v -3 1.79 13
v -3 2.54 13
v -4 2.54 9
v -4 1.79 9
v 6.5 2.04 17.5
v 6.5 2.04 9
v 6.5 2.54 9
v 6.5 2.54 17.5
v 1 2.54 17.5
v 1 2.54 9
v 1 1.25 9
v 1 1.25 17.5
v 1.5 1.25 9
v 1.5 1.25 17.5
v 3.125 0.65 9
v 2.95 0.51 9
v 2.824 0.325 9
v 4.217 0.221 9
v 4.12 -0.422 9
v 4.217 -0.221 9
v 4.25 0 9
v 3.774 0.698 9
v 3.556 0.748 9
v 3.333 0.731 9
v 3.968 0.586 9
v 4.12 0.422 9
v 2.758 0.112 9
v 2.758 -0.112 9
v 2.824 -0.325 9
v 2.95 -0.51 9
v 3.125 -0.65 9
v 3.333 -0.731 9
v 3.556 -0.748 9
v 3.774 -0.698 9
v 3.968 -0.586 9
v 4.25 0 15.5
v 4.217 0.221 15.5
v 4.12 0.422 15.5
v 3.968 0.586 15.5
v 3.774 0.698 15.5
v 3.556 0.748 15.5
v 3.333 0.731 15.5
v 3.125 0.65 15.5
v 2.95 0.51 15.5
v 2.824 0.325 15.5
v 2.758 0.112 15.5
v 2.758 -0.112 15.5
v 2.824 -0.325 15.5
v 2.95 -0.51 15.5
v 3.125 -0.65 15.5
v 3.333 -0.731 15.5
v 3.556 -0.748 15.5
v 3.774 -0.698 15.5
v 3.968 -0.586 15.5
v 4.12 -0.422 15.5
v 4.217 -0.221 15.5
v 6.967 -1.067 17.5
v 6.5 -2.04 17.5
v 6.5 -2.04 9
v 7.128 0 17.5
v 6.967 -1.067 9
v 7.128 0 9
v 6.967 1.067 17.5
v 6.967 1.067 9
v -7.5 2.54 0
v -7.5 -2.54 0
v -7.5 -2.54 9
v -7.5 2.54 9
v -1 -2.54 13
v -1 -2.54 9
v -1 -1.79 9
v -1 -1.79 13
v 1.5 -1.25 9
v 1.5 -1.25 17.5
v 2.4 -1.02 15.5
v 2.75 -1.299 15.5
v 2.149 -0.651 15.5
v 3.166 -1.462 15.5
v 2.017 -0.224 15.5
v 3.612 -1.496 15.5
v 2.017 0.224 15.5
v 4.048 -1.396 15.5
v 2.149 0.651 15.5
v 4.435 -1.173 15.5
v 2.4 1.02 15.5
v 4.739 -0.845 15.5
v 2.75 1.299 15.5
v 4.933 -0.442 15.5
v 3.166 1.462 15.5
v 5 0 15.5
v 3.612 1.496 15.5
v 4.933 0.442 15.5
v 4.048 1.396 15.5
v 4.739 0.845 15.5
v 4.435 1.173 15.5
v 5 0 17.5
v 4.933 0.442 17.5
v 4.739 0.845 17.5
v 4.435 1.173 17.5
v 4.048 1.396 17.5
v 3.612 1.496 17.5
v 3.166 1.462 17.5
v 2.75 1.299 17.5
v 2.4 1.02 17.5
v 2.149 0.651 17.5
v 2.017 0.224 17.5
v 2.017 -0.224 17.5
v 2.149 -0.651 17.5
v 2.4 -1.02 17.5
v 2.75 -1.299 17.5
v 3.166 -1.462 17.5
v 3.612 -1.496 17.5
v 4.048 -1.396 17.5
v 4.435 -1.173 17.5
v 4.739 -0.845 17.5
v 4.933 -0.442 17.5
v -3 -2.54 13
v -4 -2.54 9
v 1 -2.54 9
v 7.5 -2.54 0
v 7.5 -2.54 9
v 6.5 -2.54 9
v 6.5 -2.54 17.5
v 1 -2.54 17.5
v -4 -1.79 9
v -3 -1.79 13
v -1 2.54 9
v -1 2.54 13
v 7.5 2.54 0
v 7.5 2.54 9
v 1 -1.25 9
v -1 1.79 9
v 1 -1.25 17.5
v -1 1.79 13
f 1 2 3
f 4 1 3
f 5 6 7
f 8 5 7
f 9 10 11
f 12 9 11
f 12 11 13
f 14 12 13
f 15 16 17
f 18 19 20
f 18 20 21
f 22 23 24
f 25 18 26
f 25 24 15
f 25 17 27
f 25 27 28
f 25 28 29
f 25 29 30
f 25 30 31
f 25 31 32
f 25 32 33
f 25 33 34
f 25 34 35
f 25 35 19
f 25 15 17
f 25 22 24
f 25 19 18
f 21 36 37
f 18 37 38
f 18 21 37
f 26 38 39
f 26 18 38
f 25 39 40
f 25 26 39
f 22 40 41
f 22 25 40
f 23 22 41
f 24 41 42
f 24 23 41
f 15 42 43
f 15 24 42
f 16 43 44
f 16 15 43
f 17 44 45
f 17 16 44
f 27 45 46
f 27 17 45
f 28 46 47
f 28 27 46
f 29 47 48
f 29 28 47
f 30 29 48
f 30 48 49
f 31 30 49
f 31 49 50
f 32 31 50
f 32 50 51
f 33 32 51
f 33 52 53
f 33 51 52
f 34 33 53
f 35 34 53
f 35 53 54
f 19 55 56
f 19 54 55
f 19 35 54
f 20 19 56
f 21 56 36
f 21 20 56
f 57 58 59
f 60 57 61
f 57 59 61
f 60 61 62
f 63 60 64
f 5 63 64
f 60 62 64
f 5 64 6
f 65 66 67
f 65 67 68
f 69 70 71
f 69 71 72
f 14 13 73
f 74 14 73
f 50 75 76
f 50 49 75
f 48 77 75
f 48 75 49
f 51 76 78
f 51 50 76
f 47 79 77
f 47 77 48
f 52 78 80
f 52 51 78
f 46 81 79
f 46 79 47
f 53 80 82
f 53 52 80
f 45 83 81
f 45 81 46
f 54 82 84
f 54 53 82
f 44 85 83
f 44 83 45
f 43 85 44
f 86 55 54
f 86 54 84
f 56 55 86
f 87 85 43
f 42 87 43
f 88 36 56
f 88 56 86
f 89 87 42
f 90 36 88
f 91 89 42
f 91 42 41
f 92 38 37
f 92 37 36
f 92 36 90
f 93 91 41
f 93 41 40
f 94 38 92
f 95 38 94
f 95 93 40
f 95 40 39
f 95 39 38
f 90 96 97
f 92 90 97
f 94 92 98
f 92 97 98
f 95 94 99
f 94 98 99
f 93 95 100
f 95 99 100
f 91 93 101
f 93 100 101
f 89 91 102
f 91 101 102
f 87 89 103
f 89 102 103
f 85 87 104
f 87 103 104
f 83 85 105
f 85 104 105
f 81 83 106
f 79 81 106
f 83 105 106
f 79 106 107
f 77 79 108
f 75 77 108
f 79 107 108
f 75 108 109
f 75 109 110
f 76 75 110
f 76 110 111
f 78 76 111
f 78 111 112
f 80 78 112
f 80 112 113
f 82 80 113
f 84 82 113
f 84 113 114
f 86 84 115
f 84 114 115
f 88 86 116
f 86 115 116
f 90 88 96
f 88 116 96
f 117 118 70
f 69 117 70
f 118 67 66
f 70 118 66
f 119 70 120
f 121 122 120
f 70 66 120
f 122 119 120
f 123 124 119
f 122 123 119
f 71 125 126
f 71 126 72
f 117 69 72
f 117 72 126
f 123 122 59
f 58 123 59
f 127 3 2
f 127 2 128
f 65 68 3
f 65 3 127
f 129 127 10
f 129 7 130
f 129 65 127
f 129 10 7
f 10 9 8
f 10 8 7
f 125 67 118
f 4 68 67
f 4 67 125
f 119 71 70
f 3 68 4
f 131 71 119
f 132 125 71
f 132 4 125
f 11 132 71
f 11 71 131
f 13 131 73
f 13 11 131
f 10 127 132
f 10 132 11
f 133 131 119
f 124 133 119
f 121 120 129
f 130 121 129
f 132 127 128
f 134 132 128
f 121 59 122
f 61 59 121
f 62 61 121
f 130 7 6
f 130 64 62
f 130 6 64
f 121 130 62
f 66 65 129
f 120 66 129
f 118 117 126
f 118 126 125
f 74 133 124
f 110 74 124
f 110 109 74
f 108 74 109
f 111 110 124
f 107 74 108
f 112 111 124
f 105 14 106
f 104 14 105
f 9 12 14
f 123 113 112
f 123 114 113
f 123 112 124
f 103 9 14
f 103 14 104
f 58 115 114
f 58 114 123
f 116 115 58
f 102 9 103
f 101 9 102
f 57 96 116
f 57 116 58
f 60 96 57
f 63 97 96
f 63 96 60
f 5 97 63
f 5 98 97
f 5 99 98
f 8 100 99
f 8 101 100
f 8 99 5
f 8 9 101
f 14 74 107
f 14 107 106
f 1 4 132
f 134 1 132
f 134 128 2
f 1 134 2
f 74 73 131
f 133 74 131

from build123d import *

# Parameters (mm, degrees)
SKETCH_1_W          = 15
SKETCH_1_H          = 5.08
EXTRUDE_1_DEPTH     = 9
SKETCH_2_R          = 0.75
EXTRUDE_2_DEPTH     = 8.5
SKETCH_3_R          = 1.5
CUT_EXTRUDE_1_DEPTH = 2
EXTRUDE_3_DEPTH     = 0.75


with BuildPart() as part:
    # 草图1 → 凸台-拉伸1 (new body)
    with BuildSketch(Plane.XY):
        Rectangle(SKETCH_1_W, SKETCH_1_H)
    extrude(amount=EXTRUDE_1_DEPTH)

    # 草图2 → 凸台-拉伸2 (add)
    with BuildSketch(Plane.XY.offset(9)):
        with BuildLine():
            Line((6.5, -2.54), (6.5, -2.04))
            ThreePointArc((6.5, -2.04), (7.12789195, 0), (6.5, 2.04))
            Line((6.5, 2.04), (6.5, 2.54))
            Line((6.5, 2.54), (1, 2.54))
            Line((1, 2.54), (1, 1.25))
            Line((1, 1.25), (1.5, 1.25))
            Line((1.5, 1.25), (1.5, -1.25))
            Line((1.5, -1.25), (1, -1.25))
            Line((1, -1.25), (1, -2.54))
            Line((1, -2.54), (6.5, -2.54))
        make_face()
        with Locations((3.5, 0)):
            Circle(SKETCH_2_R, mode=Mode.SUBTRACT)
    extrude(amount=EXTRUDE_2_DEPTH)

    # 草图3 → 切除-拉伸1 (cut)
    with BuildSketch(Plane.XY.offset(17.5)):
        with Locations((3.5, 0)):
            Circle(SKETCH_3_R)
    extrude(amount=-CUT_EXTRUDE_1_DEPTH, mode=Mode.SUBTRACT)

    # 草图4 → 凸台-拉伸3 (add)
    with BuildSketch(Plane.XZ.offset(2.54)):
        Polygon((-4, 9), (-4, 8.307126737), (-1, 8.307126737), (-1, 9), (-1, 13), (-3, 13), align=None)
    extrude_3 = extrude(amount=-EXTRUDE_3_DEPTH)

    # 镜向1: 凸台-拉伸3 across plane
    add(extrude_3.mirror(Plane.ZX))


solid = part.part
